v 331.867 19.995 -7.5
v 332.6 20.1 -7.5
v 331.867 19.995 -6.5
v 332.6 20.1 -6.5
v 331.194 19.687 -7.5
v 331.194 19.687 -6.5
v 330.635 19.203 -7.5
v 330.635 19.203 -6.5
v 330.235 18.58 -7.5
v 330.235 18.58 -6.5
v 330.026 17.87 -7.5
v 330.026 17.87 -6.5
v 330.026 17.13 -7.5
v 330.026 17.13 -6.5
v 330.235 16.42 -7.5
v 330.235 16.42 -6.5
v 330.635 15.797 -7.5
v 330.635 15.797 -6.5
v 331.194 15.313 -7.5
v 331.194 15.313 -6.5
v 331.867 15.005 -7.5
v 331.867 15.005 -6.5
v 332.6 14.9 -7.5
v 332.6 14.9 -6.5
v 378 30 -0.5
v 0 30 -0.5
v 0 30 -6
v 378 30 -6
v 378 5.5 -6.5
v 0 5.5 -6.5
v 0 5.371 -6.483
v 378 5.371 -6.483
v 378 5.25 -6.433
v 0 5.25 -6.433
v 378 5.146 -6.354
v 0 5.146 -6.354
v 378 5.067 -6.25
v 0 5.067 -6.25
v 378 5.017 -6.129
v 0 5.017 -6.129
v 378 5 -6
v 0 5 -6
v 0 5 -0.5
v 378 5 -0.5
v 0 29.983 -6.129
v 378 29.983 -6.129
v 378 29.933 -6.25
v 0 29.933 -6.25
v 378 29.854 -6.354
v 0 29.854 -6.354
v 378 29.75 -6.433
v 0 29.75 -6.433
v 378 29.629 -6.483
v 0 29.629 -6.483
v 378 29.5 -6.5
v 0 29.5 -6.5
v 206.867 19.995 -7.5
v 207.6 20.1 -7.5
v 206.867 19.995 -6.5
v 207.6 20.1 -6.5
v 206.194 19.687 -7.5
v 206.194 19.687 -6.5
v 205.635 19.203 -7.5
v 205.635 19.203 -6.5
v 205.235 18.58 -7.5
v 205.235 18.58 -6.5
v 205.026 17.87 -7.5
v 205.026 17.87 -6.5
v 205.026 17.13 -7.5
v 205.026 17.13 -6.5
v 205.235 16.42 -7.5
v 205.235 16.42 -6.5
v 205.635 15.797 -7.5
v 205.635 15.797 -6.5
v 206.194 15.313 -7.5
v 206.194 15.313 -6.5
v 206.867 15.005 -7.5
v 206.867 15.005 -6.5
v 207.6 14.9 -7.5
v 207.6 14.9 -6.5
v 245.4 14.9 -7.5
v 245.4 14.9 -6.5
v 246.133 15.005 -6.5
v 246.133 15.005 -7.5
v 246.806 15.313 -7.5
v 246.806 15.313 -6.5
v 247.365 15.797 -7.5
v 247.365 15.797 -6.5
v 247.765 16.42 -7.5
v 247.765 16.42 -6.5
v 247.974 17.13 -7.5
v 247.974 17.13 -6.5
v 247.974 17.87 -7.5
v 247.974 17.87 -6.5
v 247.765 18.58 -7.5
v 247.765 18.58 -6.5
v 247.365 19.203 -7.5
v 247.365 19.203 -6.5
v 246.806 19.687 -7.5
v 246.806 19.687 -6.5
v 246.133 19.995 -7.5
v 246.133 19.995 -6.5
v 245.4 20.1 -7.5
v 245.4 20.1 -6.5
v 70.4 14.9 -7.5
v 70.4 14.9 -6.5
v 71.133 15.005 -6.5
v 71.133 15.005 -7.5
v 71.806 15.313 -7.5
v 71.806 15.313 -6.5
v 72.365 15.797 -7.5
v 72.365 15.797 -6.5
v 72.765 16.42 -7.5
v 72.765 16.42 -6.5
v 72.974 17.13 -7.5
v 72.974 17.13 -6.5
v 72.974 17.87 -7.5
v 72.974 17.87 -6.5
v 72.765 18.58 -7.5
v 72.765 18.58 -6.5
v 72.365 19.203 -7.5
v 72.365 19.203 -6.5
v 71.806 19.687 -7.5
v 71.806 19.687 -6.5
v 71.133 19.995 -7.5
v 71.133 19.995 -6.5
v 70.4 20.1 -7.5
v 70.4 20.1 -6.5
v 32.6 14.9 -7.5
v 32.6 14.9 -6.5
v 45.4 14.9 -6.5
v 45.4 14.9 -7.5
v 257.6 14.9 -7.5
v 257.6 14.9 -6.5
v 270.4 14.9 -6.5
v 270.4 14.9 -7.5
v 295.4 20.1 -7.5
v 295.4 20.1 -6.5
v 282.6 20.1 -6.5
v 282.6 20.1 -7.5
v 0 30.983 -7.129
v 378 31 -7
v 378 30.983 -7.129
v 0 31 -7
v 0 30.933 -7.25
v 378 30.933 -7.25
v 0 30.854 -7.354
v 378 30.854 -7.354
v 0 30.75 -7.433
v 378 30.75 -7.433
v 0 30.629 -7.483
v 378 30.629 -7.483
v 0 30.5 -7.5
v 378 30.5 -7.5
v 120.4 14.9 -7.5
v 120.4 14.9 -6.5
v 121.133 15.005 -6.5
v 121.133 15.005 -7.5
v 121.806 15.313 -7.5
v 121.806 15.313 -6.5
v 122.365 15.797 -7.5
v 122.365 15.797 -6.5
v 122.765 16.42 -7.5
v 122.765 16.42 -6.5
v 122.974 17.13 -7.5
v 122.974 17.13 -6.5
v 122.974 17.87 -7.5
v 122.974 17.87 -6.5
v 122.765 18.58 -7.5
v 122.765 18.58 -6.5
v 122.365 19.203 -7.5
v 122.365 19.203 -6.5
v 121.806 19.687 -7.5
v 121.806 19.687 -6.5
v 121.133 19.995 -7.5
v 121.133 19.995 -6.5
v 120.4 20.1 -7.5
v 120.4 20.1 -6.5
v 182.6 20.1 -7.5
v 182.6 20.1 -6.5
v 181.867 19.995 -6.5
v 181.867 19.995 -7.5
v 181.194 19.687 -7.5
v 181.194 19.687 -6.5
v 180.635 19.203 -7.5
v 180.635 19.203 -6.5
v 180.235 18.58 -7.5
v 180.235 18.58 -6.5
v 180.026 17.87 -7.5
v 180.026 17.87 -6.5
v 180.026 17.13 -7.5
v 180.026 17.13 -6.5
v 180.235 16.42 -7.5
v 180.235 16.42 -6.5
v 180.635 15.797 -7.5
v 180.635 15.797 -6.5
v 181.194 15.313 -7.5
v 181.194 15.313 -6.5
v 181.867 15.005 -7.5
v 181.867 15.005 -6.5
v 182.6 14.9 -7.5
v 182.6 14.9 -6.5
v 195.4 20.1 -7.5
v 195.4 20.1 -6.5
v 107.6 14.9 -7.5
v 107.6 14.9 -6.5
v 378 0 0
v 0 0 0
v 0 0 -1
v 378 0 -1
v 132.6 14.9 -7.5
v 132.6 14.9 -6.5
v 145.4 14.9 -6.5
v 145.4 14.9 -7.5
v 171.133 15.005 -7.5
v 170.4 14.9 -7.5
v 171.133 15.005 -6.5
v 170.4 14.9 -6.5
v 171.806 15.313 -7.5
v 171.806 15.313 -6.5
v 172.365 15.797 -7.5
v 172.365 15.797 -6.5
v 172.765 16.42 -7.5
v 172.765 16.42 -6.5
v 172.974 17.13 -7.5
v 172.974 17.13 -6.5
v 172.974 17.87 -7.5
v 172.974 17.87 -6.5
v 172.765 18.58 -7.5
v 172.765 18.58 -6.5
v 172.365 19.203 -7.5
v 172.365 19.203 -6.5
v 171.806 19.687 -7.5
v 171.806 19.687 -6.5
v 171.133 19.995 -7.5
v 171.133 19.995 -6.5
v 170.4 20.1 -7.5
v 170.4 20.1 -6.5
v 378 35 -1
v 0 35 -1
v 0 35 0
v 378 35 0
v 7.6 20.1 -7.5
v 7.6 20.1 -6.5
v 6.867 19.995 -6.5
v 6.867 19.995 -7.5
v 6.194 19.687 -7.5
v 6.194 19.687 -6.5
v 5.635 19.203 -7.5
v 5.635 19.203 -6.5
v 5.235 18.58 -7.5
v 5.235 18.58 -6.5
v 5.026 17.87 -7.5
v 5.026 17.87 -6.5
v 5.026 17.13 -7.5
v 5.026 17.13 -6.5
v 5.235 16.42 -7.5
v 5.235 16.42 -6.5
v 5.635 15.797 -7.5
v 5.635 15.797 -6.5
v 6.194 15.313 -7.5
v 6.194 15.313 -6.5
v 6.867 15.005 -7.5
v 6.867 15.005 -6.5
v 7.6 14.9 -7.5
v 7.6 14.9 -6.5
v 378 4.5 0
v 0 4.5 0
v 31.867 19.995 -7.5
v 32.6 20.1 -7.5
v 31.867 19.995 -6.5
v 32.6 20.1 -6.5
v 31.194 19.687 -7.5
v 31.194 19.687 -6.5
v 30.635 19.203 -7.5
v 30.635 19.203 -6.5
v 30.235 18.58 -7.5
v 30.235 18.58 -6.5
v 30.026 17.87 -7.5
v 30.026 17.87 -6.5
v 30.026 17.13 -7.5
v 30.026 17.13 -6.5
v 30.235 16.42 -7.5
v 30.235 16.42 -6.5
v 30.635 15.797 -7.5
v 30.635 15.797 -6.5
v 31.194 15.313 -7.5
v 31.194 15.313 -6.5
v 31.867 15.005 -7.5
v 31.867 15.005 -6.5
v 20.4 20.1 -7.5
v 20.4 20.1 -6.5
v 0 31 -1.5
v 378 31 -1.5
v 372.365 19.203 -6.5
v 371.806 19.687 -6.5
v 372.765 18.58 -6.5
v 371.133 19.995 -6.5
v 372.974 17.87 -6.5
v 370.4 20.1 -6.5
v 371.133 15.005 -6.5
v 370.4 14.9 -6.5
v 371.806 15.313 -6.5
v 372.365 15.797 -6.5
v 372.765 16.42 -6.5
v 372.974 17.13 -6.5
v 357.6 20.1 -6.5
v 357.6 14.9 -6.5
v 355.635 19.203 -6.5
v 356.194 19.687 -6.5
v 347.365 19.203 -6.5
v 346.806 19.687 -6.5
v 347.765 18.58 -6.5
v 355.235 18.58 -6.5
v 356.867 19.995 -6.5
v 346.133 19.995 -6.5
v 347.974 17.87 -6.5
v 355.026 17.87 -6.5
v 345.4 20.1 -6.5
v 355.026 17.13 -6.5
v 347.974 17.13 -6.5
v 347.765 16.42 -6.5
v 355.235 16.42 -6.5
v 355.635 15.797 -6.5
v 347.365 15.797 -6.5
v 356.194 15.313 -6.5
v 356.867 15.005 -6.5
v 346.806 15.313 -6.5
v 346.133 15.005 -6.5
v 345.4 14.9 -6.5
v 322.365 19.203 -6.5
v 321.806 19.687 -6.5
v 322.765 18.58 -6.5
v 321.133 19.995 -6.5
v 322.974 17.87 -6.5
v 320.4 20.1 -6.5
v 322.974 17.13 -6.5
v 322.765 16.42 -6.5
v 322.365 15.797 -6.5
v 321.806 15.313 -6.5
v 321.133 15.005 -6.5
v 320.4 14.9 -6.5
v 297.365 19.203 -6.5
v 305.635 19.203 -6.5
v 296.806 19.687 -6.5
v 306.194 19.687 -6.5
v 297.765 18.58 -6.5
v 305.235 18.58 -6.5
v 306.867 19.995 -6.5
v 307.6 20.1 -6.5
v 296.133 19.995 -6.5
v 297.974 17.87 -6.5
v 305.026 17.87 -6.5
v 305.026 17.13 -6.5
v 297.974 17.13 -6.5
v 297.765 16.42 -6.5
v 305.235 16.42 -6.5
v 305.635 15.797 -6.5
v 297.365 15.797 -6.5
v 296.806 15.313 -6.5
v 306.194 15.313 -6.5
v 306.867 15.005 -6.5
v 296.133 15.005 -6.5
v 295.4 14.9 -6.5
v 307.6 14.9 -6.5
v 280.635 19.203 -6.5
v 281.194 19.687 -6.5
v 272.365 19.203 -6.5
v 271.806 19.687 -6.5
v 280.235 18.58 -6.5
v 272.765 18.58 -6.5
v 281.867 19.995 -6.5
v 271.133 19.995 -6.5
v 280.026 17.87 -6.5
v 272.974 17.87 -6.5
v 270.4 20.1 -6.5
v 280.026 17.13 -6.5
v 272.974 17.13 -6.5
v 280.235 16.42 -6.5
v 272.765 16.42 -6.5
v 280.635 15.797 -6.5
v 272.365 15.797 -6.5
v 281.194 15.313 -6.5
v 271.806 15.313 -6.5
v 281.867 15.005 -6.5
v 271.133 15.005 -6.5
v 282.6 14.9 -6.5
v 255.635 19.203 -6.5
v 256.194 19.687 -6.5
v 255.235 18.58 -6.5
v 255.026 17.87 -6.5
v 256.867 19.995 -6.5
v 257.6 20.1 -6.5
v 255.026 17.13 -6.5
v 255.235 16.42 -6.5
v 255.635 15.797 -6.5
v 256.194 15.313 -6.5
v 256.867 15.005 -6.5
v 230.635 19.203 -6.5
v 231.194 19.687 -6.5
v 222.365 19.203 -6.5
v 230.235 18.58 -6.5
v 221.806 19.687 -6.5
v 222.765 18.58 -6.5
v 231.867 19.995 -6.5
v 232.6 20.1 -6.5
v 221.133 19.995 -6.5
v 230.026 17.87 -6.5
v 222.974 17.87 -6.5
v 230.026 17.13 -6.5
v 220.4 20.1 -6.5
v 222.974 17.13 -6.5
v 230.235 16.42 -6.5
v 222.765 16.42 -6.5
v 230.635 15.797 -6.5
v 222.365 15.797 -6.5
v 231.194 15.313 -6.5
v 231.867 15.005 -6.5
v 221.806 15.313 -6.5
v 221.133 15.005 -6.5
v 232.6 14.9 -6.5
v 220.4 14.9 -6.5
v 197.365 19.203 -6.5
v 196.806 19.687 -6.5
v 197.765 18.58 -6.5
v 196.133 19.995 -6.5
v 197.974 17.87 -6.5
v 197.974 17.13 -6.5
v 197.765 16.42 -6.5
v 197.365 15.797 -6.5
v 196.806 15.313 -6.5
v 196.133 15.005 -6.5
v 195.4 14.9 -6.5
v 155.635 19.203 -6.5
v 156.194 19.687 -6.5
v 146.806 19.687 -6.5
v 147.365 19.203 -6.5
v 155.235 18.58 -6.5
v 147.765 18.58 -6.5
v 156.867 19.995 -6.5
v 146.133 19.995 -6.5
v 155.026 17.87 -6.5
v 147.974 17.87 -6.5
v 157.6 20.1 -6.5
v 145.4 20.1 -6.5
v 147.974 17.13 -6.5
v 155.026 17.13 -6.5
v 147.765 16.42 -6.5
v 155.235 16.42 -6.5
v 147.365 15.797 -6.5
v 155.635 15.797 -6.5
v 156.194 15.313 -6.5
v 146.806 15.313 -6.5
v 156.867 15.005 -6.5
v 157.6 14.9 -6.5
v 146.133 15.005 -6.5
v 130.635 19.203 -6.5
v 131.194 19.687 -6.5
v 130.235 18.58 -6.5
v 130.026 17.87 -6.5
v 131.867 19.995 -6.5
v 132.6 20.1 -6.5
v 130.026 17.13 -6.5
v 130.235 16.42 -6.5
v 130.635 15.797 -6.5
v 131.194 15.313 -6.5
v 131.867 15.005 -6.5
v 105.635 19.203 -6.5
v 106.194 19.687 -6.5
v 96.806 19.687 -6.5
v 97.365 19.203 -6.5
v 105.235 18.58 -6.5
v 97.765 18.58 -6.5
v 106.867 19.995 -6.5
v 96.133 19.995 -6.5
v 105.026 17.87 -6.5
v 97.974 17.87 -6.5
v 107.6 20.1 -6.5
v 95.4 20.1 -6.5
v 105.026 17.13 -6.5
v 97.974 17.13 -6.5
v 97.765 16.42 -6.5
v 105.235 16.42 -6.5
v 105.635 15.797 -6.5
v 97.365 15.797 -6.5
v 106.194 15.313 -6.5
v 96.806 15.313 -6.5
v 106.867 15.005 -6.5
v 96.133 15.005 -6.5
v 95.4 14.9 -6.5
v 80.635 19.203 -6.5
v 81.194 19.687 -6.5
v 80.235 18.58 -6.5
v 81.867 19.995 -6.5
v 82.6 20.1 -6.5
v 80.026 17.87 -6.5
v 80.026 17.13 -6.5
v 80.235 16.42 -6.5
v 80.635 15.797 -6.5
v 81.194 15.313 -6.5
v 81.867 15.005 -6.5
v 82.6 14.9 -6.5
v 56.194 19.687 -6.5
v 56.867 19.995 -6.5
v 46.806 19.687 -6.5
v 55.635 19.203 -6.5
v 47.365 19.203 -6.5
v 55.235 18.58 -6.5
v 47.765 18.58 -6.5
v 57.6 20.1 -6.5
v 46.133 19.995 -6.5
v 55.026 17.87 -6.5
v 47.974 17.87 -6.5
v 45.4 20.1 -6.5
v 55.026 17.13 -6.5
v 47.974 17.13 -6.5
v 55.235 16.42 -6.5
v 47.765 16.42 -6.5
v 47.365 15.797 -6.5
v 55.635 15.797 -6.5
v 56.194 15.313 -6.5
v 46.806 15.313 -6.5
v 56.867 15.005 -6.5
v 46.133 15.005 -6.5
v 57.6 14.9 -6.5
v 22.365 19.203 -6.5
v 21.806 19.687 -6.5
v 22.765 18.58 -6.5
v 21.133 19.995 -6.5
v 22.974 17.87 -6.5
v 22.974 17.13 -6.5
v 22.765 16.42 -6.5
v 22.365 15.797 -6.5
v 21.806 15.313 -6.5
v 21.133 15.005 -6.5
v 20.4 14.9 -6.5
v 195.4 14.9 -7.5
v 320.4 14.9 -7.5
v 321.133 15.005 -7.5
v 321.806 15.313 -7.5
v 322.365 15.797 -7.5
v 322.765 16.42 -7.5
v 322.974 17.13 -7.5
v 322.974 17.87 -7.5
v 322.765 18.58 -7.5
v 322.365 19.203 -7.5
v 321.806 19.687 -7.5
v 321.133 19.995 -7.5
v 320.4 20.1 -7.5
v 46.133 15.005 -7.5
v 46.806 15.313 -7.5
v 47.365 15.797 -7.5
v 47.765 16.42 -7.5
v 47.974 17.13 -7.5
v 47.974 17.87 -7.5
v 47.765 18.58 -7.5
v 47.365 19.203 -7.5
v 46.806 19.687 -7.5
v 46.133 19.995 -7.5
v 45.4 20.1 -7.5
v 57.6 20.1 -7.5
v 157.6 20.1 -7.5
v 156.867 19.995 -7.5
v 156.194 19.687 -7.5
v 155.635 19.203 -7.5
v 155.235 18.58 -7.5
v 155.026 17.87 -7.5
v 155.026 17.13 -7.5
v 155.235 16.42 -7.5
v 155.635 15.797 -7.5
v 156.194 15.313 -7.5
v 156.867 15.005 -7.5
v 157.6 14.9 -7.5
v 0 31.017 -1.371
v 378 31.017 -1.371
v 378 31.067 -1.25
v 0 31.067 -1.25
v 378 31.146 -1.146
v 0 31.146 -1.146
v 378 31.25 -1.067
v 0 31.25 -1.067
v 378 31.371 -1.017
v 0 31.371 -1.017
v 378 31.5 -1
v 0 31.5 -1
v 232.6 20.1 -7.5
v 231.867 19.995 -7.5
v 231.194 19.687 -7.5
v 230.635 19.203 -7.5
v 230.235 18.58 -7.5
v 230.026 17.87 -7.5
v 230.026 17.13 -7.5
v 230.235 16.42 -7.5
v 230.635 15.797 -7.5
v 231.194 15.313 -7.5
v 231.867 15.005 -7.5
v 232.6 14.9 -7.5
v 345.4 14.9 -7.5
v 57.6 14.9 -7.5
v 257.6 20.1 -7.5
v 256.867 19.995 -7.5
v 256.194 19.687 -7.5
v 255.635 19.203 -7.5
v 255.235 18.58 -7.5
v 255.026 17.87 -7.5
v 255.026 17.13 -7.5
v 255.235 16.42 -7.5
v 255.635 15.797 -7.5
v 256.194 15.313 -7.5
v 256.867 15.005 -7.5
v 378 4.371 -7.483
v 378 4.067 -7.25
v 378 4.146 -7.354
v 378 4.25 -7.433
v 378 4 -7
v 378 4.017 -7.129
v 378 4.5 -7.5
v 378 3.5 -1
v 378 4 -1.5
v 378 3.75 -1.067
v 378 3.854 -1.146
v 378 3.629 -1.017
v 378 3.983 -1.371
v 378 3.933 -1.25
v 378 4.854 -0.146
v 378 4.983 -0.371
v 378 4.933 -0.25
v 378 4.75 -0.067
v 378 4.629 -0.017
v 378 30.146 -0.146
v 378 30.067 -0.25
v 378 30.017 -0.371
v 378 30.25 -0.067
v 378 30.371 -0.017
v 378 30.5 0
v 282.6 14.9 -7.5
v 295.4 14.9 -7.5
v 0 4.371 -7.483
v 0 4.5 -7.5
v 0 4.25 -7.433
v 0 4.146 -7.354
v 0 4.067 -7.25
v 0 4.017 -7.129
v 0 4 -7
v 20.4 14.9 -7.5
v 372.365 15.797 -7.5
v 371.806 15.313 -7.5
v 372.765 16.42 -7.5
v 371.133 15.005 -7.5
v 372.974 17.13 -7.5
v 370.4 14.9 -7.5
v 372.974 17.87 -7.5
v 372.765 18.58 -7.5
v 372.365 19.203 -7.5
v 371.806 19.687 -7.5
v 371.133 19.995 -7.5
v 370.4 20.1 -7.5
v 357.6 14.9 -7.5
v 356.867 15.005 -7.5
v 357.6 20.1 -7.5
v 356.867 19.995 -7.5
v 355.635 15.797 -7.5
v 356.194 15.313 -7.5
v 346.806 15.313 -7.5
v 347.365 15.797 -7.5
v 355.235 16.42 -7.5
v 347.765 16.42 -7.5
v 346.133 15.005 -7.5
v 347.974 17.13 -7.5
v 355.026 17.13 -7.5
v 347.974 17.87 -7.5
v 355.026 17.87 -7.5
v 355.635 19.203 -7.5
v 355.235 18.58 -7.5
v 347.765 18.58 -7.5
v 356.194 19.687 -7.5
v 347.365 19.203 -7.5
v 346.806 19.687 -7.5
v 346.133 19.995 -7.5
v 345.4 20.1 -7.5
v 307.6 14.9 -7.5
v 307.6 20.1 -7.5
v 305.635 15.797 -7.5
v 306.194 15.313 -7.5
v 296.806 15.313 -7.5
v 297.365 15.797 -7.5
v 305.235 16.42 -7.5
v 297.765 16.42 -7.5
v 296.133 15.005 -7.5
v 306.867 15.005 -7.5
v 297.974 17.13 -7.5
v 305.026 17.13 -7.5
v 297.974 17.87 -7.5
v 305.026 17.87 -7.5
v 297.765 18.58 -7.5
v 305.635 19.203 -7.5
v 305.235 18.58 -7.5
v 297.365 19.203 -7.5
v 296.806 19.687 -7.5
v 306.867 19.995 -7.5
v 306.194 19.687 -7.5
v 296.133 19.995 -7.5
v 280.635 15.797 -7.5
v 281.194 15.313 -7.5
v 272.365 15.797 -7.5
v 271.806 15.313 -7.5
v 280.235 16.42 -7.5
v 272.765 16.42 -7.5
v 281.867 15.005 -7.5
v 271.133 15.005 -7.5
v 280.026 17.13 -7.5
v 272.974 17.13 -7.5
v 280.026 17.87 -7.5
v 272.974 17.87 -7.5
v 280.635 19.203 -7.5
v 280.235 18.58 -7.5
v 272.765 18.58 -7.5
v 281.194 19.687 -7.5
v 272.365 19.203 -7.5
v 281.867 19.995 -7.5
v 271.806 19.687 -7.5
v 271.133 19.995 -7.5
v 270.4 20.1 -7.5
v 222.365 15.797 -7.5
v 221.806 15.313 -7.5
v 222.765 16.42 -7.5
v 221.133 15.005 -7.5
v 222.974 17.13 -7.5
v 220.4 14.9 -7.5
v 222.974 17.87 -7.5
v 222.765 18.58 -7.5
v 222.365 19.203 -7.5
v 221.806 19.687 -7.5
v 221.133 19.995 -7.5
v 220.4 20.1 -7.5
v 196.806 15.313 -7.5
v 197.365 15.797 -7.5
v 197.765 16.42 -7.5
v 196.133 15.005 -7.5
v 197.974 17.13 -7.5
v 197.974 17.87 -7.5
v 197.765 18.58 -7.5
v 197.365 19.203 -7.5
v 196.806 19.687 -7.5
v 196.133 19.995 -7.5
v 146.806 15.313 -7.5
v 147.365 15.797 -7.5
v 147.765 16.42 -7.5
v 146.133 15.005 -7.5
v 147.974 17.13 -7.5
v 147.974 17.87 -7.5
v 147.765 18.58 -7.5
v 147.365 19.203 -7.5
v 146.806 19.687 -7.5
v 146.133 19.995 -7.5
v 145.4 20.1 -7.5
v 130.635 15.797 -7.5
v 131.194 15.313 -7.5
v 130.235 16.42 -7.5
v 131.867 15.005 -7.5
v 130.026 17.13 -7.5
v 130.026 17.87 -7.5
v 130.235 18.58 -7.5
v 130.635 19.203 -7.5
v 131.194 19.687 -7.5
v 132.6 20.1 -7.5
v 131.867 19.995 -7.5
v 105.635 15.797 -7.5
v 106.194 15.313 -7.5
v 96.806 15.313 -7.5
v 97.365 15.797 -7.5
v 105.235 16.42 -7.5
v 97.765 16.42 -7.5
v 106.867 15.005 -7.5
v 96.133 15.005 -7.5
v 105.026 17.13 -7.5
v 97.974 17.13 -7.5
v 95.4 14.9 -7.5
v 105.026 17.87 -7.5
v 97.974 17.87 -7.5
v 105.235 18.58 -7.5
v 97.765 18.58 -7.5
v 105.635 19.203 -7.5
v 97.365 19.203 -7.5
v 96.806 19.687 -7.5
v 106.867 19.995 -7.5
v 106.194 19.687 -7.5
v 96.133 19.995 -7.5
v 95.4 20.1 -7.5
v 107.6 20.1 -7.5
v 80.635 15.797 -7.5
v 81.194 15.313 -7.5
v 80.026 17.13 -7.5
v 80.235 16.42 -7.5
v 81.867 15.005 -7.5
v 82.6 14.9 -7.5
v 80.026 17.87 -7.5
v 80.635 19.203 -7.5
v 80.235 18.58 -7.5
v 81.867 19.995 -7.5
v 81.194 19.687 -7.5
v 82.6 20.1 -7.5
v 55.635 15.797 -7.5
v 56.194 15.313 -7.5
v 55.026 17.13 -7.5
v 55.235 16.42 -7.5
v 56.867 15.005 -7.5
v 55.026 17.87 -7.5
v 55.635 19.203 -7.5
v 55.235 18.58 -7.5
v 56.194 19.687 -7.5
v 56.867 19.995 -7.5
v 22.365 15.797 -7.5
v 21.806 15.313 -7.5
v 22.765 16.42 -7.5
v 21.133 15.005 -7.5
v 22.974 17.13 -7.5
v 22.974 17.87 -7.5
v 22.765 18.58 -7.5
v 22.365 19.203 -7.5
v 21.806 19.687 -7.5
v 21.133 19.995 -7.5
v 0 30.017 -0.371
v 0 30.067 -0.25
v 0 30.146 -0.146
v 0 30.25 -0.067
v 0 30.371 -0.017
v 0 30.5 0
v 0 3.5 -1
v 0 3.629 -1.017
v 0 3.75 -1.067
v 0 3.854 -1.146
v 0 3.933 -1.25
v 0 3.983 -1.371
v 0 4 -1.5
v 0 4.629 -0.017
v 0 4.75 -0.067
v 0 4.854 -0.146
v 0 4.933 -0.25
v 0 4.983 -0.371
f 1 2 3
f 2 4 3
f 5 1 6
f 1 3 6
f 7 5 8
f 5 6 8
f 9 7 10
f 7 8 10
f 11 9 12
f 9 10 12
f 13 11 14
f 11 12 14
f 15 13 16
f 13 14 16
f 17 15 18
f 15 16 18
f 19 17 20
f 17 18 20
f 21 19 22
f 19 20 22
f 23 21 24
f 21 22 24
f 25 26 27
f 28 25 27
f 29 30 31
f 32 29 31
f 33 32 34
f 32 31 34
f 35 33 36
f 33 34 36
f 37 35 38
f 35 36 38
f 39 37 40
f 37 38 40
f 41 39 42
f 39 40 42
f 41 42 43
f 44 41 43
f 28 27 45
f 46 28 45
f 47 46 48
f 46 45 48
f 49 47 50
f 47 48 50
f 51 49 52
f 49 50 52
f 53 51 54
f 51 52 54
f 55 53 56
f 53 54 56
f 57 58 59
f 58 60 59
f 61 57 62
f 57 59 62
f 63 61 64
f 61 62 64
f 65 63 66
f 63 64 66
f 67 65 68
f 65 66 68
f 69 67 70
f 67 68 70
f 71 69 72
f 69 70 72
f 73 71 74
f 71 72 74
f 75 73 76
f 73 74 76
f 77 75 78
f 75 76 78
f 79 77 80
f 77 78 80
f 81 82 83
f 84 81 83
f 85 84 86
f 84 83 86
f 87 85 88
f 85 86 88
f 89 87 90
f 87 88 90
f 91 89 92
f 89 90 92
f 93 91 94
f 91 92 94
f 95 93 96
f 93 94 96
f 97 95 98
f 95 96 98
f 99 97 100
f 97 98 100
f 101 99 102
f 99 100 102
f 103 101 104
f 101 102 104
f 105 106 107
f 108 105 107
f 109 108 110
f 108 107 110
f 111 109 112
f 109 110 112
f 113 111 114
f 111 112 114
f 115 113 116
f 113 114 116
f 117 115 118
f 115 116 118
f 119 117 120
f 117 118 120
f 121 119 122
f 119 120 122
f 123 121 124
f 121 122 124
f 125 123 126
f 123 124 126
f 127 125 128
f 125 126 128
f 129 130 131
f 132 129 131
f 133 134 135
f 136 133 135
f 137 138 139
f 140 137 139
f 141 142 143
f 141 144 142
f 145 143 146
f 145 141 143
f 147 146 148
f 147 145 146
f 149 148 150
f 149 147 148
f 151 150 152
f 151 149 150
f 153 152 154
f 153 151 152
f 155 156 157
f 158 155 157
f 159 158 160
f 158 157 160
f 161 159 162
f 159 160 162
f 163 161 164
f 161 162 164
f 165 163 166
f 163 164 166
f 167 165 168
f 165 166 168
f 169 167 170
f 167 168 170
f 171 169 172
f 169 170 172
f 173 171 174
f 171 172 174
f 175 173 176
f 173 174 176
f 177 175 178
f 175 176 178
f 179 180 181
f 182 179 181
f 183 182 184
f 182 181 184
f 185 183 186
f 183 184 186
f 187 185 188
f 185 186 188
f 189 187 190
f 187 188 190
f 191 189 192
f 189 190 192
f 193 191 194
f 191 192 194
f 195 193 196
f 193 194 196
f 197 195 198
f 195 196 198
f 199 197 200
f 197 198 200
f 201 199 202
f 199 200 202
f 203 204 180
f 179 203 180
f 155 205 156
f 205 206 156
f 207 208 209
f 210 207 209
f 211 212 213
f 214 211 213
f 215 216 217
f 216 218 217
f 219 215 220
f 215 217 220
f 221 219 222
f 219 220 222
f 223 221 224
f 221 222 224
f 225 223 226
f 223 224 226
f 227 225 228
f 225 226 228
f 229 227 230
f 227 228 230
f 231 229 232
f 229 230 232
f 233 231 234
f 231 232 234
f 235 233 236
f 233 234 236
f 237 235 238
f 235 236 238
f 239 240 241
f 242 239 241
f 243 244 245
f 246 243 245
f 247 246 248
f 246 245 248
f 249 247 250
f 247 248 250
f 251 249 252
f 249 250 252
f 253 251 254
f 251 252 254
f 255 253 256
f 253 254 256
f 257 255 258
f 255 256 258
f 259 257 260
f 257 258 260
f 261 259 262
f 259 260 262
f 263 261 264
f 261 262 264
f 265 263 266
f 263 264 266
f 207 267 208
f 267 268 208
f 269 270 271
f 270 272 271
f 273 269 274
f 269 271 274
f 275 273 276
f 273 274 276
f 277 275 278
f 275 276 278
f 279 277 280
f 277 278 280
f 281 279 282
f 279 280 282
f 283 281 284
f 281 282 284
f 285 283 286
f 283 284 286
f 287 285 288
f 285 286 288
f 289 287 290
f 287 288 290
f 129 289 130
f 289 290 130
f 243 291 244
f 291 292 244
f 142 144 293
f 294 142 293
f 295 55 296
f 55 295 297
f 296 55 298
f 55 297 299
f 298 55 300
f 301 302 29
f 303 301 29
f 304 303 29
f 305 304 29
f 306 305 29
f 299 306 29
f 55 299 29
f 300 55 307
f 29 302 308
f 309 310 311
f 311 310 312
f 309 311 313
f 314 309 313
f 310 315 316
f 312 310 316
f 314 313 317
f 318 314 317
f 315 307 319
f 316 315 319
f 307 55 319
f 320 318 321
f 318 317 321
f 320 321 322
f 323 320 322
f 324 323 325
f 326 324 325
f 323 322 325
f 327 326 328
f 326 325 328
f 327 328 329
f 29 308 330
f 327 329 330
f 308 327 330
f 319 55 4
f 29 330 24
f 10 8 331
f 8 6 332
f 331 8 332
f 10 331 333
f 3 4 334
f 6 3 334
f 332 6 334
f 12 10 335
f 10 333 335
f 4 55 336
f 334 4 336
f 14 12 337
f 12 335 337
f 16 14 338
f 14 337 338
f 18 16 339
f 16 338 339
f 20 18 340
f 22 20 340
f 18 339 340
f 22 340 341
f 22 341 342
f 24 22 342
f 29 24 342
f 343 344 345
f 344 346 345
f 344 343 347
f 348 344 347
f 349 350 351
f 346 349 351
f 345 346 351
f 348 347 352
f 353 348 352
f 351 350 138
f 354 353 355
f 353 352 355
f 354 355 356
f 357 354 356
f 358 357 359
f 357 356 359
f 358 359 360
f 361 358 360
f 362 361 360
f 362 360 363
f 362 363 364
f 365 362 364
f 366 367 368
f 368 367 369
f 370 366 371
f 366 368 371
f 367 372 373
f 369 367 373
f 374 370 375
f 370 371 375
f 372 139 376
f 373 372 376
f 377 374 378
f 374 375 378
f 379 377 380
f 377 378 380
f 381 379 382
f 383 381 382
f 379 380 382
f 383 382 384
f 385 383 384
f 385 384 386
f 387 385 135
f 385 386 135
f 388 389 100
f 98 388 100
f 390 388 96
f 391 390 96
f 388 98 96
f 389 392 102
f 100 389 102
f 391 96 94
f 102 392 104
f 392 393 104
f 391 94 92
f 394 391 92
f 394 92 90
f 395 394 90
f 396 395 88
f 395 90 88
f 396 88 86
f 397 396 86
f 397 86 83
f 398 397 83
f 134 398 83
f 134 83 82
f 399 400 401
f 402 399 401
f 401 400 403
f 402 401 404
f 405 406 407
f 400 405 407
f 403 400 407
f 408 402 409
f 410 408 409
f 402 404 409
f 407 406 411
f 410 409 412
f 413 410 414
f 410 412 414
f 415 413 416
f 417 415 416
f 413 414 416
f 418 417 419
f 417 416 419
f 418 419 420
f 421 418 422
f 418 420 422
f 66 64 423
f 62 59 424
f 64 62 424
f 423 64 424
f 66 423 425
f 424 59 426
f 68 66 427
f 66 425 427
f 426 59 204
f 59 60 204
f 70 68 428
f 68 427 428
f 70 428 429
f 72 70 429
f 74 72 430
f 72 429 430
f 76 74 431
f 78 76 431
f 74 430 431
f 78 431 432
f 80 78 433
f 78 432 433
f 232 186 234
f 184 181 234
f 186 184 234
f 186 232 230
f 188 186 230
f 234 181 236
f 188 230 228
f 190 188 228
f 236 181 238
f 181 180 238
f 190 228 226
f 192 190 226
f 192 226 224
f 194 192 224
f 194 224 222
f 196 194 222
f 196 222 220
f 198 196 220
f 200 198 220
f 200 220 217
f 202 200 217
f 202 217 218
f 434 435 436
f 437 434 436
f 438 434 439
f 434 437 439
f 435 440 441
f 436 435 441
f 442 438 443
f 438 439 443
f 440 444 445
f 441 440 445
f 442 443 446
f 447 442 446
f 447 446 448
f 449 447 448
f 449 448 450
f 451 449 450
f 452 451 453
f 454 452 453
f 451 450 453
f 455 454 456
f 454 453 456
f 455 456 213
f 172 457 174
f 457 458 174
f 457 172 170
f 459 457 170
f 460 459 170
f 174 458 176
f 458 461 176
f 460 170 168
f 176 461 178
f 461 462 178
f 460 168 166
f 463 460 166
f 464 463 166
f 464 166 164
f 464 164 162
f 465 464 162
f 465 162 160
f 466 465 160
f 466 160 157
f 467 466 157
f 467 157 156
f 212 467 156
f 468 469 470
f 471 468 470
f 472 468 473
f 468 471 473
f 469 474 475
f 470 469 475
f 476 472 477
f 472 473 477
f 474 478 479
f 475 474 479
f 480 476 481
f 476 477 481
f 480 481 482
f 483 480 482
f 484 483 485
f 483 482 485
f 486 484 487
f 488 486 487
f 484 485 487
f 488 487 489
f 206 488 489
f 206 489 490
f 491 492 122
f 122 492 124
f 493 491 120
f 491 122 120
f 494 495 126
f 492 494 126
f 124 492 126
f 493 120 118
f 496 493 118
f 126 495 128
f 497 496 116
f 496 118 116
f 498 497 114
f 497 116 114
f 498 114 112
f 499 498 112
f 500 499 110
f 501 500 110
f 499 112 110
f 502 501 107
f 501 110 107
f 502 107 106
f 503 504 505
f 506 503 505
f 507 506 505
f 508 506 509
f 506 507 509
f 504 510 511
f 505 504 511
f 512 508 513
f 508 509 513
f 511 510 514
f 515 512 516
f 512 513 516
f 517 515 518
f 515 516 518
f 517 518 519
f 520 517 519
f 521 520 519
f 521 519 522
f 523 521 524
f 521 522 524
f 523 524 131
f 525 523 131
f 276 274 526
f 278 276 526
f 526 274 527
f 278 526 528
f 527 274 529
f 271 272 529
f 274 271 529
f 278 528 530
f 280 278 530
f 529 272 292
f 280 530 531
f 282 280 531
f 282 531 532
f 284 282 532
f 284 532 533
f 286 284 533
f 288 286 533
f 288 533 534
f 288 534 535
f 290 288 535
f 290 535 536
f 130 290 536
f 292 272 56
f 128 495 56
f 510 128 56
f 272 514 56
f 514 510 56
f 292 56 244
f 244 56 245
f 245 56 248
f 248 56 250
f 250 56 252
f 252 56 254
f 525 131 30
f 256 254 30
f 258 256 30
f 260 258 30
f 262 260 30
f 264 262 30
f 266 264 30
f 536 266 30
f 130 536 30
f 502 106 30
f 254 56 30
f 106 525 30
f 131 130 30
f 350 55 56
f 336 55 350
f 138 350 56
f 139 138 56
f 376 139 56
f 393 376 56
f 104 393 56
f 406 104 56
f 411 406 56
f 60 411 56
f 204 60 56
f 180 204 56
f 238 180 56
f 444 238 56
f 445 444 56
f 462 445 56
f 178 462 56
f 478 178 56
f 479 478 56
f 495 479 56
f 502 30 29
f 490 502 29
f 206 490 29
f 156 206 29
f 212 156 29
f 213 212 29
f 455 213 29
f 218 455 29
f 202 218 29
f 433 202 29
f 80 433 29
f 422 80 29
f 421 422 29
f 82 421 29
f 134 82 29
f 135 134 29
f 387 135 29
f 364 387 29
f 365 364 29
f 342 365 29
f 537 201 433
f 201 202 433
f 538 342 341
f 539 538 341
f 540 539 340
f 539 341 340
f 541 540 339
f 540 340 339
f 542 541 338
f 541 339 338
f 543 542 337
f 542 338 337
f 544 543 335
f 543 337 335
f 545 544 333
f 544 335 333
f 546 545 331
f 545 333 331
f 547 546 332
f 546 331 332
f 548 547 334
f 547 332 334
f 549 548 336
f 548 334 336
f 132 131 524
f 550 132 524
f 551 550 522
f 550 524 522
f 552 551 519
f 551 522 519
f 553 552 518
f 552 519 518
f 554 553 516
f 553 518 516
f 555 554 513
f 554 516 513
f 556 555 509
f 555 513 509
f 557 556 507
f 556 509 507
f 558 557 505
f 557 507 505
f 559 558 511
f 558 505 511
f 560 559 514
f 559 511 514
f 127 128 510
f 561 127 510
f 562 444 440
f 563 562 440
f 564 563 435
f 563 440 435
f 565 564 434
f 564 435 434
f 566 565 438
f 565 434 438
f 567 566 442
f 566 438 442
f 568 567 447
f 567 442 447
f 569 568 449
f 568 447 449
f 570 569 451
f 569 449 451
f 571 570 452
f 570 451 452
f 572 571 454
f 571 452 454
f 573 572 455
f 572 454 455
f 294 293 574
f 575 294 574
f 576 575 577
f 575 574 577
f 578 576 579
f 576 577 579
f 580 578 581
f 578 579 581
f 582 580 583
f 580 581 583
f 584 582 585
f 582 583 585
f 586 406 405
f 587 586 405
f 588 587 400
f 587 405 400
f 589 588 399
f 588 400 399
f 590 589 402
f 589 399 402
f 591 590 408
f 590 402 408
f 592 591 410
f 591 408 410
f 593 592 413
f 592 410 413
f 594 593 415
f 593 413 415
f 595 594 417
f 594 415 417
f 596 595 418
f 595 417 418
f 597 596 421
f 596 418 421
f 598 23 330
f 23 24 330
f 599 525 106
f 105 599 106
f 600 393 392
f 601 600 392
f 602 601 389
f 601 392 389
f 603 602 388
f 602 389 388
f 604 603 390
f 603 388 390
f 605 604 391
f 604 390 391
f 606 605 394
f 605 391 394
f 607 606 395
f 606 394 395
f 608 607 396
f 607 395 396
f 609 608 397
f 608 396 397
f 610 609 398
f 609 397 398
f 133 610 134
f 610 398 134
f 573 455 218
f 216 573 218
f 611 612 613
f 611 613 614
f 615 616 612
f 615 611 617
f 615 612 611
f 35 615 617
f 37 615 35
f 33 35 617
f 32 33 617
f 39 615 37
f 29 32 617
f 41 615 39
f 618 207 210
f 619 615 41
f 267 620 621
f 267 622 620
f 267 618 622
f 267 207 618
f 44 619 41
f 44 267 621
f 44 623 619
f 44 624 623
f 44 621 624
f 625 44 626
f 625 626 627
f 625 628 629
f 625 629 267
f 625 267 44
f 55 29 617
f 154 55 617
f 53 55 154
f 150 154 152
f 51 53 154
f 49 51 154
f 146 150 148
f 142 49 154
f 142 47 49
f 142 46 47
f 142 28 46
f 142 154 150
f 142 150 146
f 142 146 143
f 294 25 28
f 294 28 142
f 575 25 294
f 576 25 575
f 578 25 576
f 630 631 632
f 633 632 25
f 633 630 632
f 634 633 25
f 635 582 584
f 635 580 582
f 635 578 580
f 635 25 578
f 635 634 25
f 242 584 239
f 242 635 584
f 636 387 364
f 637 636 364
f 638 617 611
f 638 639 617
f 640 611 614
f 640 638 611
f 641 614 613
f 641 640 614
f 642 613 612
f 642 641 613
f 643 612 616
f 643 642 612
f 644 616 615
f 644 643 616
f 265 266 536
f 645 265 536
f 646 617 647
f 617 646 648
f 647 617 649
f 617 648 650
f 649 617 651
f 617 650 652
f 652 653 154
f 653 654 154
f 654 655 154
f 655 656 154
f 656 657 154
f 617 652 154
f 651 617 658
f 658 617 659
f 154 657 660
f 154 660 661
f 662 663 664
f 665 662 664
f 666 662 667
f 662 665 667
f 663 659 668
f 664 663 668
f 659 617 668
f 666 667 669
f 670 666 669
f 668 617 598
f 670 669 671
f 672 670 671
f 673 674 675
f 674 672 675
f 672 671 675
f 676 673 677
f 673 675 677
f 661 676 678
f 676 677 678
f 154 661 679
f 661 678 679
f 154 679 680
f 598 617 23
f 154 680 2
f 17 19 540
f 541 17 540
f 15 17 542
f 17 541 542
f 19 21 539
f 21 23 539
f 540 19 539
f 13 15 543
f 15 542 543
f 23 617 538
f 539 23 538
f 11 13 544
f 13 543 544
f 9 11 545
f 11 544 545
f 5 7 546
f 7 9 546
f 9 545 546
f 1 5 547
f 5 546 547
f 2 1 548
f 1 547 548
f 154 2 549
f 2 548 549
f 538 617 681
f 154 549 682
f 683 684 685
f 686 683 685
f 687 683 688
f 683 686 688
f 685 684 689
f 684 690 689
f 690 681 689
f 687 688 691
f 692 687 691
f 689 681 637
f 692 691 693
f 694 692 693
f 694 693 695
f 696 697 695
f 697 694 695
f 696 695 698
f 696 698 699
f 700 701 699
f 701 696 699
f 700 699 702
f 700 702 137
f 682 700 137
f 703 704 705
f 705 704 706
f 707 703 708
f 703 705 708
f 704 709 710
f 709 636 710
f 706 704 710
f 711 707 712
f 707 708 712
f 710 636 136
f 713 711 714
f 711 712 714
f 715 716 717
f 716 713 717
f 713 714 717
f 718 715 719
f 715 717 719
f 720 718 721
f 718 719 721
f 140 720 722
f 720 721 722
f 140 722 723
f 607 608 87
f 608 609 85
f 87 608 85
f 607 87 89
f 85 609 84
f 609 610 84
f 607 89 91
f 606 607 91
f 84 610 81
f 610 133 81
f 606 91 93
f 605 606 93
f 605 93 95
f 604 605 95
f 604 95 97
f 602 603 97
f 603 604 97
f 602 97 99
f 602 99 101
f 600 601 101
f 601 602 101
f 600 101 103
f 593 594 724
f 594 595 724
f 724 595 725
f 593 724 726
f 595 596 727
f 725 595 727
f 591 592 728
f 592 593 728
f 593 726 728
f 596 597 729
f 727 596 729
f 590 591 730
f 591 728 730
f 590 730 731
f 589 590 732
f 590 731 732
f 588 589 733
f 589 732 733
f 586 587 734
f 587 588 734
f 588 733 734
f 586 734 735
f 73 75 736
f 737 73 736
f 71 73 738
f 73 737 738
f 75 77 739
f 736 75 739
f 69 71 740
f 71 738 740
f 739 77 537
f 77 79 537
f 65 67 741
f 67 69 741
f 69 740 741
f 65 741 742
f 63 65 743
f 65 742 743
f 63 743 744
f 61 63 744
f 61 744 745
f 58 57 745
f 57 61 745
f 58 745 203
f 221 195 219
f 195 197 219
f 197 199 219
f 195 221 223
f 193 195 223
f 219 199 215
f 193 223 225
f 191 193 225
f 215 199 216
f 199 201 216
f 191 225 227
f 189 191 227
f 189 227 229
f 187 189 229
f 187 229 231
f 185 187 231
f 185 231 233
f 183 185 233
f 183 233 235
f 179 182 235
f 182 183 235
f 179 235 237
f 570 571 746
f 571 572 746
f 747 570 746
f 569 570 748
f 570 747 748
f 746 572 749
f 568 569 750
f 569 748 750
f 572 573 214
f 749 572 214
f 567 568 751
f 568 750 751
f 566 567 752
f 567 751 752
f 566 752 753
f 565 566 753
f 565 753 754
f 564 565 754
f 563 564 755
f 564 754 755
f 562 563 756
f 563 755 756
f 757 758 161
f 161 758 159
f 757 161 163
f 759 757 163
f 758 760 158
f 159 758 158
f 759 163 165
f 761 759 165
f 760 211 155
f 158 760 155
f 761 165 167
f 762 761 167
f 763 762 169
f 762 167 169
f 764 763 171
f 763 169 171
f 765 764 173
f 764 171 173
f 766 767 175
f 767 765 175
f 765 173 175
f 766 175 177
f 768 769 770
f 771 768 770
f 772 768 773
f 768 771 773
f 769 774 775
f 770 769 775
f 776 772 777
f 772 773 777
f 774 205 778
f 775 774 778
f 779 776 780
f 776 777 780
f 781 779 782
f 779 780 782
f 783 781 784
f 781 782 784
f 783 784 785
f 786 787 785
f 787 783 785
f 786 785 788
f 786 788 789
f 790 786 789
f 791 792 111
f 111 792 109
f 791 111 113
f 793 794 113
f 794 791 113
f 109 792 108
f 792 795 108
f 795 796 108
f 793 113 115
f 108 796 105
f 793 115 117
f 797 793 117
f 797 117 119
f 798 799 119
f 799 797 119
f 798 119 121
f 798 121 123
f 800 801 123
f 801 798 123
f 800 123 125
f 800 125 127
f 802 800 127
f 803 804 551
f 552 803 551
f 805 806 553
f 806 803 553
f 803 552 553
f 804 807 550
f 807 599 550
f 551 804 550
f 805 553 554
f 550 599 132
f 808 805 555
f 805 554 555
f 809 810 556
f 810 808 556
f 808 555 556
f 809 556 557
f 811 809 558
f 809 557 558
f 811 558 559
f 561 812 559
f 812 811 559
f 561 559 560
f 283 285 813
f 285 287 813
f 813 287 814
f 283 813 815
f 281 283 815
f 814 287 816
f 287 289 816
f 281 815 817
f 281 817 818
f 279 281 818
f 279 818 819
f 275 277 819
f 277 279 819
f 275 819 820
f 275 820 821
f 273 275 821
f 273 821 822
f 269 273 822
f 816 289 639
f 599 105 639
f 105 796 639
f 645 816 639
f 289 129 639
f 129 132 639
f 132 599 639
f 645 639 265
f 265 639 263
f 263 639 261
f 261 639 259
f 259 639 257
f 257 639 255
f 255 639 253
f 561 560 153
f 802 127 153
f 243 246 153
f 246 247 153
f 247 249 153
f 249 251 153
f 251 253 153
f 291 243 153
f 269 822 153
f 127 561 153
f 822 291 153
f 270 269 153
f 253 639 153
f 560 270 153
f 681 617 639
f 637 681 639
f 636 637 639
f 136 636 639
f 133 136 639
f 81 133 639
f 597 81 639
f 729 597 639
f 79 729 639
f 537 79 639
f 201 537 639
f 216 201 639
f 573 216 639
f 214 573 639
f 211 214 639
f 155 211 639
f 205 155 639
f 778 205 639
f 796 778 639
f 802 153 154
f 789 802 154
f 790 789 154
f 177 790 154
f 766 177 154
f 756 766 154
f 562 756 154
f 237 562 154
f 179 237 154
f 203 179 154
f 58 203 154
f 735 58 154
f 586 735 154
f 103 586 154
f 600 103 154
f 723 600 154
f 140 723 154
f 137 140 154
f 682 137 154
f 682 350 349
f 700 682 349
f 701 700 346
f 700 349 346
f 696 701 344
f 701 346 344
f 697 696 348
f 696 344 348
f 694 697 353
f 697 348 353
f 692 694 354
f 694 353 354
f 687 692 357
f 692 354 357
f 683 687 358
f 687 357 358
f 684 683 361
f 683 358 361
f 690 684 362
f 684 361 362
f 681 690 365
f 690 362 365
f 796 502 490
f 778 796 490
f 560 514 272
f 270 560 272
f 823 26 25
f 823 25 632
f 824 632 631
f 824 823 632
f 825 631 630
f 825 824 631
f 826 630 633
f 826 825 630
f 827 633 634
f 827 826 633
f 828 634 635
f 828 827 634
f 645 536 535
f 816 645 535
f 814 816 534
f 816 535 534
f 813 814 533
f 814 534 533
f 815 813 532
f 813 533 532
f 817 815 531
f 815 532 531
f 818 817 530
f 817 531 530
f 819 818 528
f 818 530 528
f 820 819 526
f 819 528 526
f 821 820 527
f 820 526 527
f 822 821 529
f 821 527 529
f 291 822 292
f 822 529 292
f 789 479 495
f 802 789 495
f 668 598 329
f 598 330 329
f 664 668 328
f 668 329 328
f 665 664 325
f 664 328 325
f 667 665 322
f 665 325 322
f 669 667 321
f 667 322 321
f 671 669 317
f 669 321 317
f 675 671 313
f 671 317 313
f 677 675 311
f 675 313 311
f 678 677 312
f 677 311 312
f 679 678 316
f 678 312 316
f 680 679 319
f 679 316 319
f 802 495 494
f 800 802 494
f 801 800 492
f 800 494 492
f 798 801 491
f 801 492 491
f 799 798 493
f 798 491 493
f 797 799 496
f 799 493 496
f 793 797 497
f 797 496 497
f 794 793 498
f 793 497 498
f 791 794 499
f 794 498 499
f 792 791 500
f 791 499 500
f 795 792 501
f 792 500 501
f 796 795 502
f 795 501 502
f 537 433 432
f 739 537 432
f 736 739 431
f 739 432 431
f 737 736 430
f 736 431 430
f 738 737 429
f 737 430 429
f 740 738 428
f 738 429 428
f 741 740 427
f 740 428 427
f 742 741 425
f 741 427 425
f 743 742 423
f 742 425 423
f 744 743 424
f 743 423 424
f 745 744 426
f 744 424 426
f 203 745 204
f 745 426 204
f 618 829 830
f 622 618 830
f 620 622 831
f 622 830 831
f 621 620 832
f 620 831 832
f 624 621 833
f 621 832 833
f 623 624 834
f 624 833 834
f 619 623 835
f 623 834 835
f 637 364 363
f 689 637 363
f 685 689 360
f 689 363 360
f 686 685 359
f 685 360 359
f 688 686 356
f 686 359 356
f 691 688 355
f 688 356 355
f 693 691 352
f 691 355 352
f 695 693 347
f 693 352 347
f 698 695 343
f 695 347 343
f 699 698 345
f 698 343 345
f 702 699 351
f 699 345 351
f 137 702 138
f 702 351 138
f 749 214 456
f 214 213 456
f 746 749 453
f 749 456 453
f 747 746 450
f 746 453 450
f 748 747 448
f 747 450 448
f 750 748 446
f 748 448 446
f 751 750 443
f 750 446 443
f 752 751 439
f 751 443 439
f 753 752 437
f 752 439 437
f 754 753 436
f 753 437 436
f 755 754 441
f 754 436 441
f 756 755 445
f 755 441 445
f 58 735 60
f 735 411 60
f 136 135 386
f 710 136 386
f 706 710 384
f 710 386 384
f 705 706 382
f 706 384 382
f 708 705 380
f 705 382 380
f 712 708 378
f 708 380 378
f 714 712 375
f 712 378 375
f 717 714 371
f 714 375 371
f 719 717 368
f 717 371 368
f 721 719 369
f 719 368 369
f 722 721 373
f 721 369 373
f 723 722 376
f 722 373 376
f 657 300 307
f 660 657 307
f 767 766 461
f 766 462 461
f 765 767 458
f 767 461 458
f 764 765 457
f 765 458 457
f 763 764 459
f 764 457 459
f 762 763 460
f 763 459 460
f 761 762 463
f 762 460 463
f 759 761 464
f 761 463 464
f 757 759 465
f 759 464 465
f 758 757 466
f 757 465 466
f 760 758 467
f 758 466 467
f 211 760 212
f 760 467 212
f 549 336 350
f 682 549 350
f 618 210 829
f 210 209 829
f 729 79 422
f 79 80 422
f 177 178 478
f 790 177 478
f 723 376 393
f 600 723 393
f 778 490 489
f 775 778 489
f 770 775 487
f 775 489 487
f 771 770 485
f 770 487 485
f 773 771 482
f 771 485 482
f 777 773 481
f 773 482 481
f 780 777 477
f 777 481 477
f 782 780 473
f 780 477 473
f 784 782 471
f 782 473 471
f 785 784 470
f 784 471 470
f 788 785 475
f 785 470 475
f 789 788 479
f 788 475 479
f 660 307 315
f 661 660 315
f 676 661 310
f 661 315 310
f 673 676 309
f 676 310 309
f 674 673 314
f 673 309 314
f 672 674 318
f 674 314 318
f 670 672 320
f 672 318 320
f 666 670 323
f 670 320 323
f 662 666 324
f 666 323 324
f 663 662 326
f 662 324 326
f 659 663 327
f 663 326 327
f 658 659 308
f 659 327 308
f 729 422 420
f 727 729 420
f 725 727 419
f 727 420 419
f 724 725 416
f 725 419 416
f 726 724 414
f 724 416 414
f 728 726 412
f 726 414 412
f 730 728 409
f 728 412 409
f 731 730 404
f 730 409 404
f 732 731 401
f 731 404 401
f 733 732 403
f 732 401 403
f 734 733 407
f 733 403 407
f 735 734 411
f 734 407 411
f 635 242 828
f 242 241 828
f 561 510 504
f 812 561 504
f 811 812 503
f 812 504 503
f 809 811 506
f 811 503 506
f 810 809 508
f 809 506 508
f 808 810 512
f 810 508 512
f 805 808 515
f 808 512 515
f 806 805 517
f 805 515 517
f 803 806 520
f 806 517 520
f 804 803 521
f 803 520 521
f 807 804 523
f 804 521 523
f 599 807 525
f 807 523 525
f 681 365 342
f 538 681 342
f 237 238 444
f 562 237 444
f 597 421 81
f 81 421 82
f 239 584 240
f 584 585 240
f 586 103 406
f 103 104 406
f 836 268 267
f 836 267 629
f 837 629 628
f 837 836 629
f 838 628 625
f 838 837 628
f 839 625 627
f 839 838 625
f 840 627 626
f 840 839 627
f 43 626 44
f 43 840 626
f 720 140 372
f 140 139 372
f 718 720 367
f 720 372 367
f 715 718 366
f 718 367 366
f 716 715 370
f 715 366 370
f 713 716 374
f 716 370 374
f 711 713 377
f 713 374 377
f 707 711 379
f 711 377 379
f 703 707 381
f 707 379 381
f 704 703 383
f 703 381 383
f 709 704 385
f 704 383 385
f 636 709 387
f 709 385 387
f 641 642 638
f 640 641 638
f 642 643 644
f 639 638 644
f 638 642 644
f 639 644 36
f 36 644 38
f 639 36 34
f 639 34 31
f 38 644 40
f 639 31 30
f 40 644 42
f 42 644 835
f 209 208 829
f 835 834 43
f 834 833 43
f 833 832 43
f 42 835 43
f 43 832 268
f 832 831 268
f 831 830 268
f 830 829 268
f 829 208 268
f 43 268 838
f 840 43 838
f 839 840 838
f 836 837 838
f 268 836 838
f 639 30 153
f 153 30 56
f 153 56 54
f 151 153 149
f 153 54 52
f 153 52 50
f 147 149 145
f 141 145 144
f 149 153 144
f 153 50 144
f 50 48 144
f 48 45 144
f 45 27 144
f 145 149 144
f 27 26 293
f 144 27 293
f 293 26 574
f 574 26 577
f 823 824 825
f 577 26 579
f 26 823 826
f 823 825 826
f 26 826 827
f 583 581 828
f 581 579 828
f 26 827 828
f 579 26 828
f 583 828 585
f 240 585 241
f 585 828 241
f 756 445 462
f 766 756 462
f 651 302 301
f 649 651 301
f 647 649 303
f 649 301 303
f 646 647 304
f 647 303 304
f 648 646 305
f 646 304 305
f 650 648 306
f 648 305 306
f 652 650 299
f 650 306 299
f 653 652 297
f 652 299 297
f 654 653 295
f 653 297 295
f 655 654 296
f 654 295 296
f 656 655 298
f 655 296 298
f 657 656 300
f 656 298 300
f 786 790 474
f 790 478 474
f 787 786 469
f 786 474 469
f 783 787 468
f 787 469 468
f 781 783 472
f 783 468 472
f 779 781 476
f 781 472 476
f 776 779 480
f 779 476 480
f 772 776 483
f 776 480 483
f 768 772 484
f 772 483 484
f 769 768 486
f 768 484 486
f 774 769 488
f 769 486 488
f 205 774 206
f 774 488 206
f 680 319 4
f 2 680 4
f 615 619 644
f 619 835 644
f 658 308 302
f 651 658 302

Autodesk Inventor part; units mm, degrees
ref_plane "YZ Plane" through (0, 0, 0) normal (1, 0, 0) x (0, 1, 0)
ref_plane "XZ Plane" through (0, 0, 0) normal (0, 1, 0) x (-1, 0, 0)
ref_plane "XY Plane" through (0, 0, 0) normal (0, 0, 1) x (1, 0, 0)
sketch "Boceto principal" plane through (0, 0, 0) normal (1, 0, 0) x (0, 1, 0)
  line L0 (0, 0) -> (0, -1)
  line L1 (0, -1) -> (3.5, -1)
  line L2 (4, -1.5) -> (4, -7)
  line L3 (4.5, -7.5) -> (30.5, -7.5)
  line L4 (31, -7) -> (31, -1.5)
  line L5 (31.5, -1) -> (35, -1)
  line L6 (35, -1) -> (35, 0)
  line L7 (35, 0) -> (30.5, 0)
  line L8 (30, -0.5) -> (30, -6)
  line L9 (29.5, -6.5) -> (5.5, -6.5)
  line L10 (5, -6) -> (5, -0.5)
  line L11 (4.5, 0) -> (0, 0)
  arc A0 (4, -1.5) -> (3.5, -1) centre (3.5, -1.5) ccw
  arc A1 (4, -7) -> (4.5, -7.5) centre (4.5, -7) ccw
  arc A2 (30.5, -7.5) -> (31, -7) centre (30.5, -7) ccw
  arc A3 (31.5, -1) -> (31, -1.5) centre (31.5, -1.5) ccw
  arc A4 (30.5, 0) -> (30, -0.5) centre (30.5, -0.5) ccw
  arc A5 (29.5, -6.5) -> (30, -6) centre (29.5, -6) ccw
  arc A6 (5, -6) -> (5.5, -6.5) centre (5.5, -6) ccw
  arc A7 (5, -0.5) -> (4.5, 0) centre (4.5, -0.5) ccw
extrude "Extrusion1" add sketch "Boceto principal" along normal blind 378
sketch "Boceto agujeros" plane through (0, 0, 0) normal (0, 0, 1) x (1, 0, 0)
  line L0 (7.6, 14.9) -> (20.4, 14.9)
  line L1 (20.4, 20.1) -> (7.6, 20.1)
  arc A0 (7.6, 20.1) -> (7.6, 14.9) centre (7.6, 17.5) ccw
  arc A1 (20.4, 14.9) -> (20.4, 20.1) centre (20.4, 17.5) ccw
extrude "Extrusion2" cut sketch "Boceto agujeros" against normal blind 15
pattern_linear "Rectangular Pattern1" count 16 spacing 25 along (1, 0, 0) of "Extrusion2"
properties part number "Riel 35x7.5 378mm" material "Steel, Galvanized"
